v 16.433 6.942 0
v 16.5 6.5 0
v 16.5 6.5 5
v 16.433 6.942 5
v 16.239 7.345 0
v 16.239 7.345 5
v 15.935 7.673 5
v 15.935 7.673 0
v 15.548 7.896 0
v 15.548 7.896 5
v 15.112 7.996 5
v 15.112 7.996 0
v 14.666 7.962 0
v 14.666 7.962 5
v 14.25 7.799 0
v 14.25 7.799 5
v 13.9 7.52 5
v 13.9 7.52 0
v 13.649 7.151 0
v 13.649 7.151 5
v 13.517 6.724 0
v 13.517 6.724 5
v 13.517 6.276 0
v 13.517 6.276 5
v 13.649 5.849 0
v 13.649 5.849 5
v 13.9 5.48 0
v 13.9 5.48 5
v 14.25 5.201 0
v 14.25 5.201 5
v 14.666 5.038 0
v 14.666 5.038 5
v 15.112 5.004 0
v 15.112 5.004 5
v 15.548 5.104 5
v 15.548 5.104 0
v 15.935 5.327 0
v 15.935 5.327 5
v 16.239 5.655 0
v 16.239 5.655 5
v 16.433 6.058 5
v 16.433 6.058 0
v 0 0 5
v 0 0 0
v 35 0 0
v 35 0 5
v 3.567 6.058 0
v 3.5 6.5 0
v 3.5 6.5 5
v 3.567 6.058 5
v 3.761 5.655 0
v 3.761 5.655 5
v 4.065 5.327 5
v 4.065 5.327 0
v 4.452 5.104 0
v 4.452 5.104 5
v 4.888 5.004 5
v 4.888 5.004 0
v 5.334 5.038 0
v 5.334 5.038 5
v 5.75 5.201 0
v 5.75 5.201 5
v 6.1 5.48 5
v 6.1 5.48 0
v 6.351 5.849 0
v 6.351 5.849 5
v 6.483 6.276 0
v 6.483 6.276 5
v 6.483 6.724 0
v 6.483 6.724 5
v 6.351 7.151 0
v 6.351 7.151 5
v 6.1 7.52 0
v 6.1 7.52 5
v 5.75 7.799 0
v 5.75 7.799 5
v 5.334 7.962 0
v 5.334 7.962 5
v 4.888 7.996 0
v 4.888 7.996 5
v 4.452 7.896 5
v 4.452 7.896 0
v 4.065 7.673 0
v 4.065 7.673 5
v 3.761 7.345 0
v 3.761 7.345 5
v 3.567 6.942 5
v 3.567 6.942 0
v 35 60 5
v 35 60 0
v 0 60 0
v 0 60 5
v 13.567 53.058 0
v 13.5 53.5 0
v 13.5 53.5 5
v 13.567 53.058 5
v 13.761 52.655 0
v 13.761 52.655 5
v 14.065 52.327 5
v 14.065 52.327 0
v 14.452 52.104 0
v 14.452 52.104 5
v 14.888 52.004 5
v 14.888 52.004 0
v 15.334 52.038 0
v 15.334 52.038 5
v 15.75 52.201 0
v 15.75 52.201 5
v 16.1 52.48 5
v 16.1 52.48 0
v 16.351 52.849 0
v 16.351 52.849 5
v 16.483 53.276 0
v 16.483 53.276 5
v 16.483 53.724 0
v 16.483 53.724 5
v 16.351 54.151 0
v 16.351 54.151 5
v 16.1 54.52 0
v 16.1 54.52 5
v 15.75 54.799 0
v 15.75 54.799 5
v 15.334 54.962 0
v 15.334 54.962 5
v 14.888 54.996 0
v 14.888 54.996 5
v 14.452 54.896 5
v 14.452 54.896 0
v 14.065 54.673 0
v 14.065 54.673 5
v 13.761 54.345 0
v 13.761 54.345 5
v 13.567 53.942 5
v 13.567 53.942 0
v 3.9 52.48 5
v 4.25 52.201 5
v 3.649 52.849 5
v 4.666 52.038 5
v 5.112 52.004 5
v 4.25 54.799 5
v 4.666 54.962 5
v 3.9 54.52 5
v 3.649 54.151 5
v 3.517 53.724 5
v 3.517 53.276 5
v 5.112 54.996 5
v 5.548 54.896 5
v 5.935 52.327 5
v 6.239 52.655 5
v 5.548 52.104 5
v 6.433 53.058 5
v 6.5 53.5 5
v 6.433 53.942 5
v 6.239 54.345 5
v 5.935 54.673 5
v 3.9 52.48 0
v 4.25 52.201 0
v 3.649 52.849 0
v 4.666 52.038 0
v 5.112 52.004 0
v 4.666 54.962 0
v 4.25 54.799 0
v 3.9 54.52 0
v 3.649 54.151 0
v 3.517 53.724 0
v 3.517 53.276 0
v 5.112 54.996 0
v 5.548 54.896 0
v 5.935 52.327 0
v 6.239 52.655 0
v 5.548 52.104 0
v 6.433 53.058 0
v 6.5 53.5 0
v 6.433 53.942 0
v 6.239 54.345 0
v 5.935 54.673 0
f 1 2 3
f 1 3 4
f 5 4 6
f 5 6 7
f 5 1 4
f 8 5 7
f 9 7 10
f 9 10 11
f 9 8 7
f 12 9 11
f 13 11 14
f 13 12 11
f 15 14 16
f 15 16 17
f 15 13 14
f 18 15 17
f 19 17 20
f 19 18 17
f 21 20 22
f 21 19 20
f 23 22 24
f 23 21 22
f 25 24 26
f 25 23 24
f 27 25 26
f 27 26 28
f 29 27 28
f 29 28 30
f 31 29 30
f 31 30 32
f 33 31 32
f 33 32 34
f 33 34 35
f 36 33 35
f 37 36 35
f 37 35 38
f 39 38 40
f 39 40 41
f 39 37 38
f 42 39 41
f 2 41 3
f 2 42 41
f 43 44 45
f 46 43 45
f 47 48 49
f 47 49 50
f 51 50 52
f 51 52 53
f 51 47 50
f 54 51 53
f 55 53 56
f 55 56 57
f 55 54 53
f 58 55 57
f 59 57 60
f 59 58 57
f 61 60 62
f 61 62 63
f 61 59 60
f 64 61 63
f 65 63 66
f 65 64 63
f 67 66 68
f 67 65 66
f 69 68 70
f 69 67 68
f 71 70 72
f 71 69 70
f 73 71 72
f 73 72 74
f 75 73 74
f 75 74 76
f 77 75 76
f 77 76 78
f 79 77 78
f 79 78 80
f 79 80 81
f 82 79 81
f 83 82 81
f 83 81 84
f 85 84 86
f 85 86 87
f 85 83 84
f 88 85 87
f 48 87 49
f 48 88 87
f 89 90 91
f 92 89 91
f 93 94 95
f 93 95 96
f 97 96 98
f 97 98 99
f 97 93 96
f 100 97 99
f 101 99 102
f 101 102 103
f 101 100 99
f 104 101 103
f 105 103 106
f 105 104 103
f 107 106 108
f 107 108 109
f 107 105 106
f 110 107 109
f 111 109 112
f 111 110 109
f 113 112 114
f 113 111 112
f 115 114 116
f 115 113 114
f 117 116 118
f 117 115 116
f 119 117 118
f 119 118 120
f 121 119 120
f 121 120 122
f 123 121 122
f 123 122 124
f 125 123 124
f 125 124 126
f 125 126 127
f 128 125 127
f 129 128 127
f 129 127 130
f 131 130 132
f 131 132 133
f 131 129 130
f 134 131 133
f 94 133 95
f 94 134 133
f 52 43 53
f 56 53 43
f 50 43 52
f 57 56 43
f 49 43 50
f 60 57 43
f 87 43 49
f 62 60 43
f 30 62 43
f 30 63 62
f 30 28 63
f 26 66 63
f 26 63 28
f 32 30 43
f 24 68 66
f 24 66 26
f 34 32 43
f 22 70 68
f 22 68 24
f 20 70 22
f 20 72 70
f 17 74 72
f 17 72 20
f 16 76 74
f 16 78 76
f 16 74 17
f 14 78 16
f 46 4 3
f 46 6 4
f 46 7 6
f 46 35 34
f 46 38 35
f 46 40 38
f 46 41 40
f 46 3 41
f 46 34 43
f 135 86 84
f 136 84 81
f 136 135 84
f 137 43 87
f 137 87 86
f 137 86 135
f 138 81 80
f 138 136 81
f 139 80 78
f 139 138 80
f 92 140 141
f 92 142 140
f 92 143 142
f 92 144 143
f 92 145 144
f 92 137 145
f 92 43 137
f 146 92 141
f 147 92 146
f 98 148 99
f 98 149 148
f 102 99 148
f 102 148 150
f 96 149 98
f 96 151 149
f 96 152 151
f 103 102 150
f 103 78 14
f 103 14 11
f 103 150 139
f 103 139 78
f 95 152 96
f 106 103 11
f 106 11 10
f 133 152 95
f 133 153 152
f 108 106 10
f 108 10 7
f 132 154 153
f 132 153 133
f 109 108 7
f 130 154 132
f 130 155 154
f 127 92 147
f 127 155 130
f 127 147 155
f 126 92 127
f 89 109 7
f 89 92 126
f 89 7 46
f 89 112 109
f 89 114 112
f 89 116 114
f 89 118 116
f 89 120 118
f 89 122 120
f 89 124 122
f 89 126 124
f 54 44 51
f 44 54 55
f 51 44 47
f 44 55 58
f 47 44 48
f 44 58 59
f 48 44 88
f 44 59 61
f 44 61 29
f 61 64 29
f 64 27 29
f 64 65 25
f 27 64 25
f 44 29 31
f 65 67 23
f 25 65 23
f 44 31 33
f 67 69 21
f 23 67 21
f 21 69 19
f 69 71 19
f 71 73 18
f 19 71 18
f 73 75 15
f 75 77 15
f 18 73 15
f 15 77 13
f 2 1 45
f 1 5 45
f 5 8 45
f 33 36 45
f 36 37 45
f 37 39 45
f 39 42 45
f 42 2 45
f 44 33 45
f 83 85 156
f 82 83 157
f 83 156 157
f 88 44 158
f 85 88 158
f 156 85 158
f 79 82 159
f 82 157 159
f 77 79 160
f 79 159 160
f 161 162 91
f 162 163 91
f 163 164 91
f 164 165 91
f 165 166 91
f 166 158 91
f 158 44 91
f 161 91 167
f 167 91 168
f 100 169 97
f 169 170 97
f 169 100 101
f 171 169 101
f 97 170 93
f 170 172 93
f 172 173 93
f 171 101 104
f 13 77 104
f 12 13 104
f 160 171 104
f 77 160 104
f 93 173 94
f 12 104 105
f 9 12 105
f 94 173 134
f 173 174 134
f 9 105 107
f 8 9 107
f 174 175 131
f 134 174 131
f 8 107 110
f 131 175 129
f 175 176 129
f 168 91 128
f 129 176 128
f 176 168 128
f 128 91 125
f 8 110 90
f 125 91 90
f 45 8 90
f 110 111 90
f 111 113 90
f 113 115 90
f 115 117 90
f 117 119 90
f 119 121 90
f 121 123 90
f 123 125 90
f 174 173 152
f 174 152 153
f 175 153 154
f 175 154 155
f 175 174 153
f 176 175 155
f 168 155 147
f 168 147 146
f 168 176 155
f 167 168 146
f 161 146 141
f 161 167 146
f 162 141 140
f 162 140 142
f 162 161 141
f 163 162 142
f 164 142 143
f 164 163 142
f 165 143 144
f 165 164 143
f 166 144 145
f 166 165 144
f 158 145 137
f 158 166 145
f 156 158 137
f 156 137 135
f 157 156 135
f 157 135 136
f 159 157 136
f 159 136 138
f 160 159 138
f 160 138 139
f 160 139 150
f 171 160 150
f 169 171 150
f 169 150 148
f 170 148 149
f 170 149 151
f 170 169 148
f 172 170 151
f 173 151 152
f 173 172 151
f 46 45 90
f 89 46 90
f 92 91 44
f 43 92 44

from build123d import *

# Parameters (mm, degrees)
ESQUISSE1_R        = 1.5
BOSS_EXTRU_1_DEPTH = 5


with BuildPart() as part:
    # Esquisse1 → Boss.-Extru.1 (new body)
    with BuildSketch(Plane.XY):
        Polygon((0, 0), (35, 0), (35, 60), (0, 60), (0, 50), (0, 10), align=None)
        with Locations((5, 53.5)):
            Circle(ESQUISSE1_R, mode=Mode.SUBTRACT)
        with Locations(Location((15, 53.5, 0), (0, 0, 180))):
            Circle(ESQUISSE1_R, mode=Mode.SUBTRACT)
        with Locations((15, 6.5)):
            Circle(ESQUISSE1_R, mode=Mode.SUBTRACT)
        with Locations(Location((5, 6.5, 0), (0, 0, 180))):
            Circle(ESQUISSE1_R, mode=Mode.SUBTRACT)
    extrude(amount=BOSS_EXTRU_1_DEPTH)


solid = part.part
